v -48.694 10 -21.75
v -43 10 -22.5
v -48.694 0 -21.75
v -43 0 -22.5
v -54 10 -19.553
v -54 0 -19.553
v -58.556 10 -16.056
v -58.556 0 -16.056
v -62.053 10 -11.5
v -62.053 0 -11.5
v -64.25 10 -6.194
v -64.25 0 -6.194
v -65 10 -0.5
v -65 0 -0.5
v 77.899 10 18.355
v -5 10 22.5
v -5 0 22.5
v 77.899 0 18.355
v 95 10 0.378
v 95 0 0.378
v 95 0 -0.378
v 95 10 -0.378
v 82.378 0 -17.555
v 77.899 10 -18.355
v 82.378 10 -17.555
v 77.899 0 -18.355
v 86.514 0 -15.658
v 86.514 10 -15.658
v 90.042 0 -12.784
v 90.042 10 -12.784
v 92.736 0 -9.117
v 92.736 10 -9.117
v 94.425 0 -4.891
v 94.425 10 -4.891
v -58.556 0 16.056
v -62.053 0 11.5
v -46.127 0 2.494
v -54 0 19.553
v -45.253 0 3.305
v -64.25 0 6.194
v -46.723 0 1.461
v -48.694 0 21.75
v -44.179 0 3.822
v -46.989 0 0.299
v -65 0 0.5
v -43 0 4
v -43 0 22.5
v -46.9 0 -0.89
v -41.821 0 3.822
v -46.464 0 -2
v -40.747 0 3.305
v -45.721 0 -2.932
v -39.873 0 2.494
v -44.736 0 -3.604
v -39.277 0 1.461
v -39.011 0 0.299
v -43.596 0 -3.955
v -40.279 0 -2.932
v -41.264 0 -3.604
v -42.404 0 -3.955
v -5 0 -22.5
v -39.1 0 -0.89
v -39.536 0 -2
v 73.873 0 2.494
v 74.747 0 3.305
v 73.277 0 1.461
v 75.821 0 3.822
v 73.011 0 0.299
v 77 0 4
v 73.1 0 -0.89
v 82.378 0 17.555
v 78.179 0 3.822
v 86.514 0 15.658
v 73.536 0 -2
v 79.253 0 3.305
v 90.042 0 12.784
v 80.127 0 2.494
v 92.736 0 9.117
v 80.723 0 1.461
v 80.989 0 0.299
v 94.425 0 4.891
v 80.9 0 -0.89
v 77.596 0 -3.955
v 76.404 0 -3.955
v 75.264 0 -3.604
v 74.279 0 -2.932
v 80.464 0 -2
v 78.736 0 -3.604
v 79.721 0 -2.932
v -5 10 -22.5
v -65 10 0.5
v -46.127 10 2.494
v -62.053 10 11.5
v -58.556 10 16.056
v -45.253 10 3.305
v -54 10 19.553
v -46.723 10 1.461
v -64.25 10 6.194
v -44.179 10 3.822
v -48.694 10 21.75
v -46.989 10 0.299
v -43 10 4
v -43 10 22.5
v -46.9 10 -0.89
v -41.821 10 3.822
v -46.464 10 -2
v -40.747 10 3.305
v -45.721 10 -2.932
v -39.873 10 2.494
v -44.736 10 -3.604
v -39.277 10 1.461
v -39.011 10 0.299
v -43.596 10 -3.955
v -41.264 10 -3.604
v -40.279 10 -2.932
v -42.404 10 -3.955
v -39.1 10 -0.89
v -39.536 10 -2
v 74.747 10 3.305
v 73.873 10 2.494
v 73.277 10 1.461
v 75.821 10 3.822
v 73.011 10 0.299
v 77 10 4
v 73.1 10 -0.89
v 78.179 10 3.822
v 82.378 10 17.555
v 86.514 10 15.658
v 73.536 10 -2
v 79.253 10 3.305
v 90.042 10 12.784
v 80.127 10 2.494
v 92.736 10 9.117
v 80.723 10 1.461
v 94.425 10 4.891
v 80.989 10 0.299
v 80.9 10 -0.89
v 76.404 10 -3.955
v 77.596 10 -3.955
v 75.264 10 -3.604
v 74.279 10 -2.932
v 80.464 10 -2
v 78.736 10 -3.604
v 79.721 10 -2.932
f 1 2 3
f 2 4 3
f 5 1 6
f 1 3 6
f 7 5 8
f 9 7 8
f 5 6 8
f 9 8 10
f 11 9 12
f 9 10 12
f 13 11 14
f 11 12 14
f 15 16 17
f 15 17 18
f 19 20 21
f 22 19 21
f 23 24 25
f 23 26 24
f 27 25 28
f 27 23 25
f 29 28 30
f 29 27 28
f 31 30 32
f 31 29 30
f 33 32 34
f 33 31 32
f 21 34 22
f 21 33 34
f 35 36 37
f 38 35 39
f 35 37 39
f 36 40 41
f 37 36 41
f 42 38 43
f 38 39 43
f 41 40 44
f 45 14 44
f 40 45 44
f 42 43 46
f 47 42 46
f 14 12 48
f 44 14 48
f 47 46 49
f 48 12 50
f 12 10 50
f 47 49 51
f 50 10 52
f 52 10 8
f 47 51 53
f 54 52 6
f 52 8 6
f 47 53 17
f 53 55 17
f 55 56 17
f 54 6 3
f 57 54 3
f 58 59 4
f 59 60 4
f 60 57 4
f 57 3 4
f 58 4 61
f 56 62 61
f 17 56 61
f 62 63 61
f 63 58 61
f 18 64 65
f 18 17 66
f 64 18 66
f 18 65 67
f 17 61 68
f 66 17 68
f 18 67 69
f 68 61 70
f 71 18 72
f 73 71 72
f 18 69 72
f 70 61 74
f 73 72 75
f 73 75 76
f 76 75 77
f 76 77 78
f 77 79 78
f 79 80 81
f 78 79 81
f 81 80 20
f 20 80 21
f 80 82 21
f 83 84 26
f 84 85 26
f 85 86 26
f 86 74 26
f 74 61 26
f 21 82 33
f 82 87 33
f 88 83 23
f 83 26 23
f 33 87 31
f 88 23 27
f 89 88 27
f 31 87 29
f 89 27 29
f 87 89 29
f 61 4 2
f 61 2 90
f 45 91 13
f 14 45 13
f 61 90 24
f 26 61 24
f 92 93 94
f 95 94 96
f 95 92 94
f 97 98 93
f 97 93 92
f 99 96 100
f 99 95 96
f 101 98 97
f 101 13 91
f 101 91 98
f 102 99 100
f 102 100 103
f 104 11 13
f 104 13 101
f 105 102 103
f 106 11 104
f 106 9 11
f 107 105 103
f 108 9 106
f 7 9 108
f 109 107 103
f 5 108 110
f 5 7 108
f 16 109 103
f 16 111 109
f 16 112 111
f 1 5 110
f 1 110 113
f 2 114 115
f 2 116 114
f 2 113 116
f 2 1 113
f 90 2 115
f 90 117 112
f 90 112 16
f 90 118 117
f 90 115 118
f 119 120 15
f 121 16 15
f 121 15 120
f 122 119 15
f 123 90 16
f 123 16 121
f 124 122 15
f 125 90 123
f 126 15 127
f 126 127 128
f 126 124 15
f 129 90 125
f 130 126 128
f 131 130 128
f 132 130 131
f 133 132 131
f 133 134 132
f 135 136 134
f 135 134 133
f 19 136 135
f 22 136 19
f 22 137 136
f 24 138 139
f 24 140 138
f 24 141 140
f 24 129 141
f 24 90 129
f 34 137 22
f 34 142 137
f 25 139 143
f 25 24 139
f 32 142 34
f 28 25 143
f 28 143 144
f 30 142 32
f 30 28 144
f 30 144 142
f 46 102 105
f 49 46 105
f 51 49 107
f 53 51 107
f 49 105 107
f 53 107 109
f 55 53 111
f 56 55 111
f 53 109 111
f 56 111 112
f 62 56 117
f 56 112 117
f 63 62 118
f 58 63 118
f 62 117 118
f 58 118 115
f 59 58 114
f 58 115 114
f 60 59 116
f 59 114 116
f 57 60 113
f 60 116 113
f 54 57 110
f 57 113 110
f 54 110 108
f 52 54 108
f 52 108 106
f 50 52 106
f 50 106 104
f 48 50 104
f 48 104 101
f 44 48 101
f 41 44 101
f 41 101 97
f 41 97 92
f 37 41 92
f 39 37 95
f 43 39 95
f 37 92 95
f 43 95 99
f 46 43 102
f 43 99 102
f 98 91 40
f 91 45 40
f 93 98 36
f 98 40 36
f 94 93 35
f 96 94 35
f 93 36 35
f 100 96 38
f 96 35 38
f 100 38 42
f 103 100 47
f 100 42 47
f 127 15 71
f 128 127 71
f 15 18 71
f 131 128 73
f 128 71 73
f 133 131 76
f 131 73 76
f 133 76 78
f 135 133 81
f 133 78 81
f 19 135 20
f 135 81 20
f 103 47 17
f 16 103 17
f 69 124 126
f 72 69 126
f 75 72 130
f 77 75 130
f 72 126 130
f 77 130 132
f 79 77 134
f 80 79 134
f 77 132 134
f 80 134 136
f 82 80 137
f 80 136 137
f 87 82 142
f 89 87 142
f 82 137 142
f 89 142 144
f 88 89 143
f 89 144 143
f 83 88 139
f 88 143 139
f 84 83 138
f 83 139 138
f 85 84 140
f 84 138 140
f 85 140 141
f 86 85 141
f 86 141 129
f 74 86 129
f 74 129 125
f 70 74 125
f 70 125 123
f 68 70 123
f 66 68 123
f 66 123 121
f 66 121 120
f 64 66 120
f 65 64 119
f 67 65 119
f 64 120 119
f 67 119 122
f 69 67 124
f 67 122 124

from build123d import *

# Parameters (mm, degrees)
SKETCH1_W           = 190
SKETCH1_H           = 45
BOSS_EXTRUDE1_DEPTH = 10
SKETCH2_R           = 4
CUT_EXTRUDE1_DEPTH  = 10
SKETCH3_W           = 30
SKETCH3_H           = 45
CUT_EXTRUDE2_DEPTH  = 10
FILLET1_R           = 18
FILLET2_R           = 22


with BuildPart() as part:
    # Sketch1 → Boss-Extrude1 (new body)
    with BuildSketch(Plane(origin=(0, 0, 0), x_dir=(1, 0, 0), z_dir=(0, 1, 0))):
        Rectangle(SKETCH1_W, SKETCH1_H)
    extrude(amount=BOSS_EXTRUDE1_DEPTH)

    # Sketch2 → Cut-Extrude1 (cut)
    with BuildSketch(Plane(origin=(0, 10, 0), x_dir=(1, 0, 0), z_dir=(0, 1, 0))):
        with Locations(Location((-43, 0, 0), (0, 0, 270))):
            Circle(SKETCH2_R)
        with Locations(Location((77, 0, 0), (0, 0, 270))):
            Circle(SKETCH2_R)
    extrude(amount=-CUT_EXTRUDE1_DEPTH, mode=Mode.SUBTRACT)

    # Sketch3 → Cut-Extrude2 (cut)
    with BuildSketch(Plane(origin=(0, 10, 0), x_dir=(1, 0, 0), z_dir=(0, 1, 0))):
        Polygon((95, -22.5), (-5, -22.5), (95, -17.5), align=None)
        Polygon((-5, 22.5), (95, 17.5), (95, 22.5), align=None)
        with Locations((-80, 0)):
            Rectangle(SKETCH3_W, SKETCH3_H)
    extrude(amount=-CUT_EXTRUDE2_DEPTH, mode=Mode.SUBTRACT)

    # Fillet1
    fillet1_edges = [part.edges().sort_by_distance(p)[0] for p in [
        (95, 5, -17.5),
        (95, 5, 17.5),
    ]]
    fillet(fillet1_edges, radius=FILLET1_R)

    # Fillet2
    fillet2_edges = [part.edges().sort_by_distance(p)[0] for p in [
        (-65, 5, -22.5),
        (-65, 5, 22.5),
    ]]
    fillet(fillet2_edges, radius=FILLET2_R)


solid = part.part
